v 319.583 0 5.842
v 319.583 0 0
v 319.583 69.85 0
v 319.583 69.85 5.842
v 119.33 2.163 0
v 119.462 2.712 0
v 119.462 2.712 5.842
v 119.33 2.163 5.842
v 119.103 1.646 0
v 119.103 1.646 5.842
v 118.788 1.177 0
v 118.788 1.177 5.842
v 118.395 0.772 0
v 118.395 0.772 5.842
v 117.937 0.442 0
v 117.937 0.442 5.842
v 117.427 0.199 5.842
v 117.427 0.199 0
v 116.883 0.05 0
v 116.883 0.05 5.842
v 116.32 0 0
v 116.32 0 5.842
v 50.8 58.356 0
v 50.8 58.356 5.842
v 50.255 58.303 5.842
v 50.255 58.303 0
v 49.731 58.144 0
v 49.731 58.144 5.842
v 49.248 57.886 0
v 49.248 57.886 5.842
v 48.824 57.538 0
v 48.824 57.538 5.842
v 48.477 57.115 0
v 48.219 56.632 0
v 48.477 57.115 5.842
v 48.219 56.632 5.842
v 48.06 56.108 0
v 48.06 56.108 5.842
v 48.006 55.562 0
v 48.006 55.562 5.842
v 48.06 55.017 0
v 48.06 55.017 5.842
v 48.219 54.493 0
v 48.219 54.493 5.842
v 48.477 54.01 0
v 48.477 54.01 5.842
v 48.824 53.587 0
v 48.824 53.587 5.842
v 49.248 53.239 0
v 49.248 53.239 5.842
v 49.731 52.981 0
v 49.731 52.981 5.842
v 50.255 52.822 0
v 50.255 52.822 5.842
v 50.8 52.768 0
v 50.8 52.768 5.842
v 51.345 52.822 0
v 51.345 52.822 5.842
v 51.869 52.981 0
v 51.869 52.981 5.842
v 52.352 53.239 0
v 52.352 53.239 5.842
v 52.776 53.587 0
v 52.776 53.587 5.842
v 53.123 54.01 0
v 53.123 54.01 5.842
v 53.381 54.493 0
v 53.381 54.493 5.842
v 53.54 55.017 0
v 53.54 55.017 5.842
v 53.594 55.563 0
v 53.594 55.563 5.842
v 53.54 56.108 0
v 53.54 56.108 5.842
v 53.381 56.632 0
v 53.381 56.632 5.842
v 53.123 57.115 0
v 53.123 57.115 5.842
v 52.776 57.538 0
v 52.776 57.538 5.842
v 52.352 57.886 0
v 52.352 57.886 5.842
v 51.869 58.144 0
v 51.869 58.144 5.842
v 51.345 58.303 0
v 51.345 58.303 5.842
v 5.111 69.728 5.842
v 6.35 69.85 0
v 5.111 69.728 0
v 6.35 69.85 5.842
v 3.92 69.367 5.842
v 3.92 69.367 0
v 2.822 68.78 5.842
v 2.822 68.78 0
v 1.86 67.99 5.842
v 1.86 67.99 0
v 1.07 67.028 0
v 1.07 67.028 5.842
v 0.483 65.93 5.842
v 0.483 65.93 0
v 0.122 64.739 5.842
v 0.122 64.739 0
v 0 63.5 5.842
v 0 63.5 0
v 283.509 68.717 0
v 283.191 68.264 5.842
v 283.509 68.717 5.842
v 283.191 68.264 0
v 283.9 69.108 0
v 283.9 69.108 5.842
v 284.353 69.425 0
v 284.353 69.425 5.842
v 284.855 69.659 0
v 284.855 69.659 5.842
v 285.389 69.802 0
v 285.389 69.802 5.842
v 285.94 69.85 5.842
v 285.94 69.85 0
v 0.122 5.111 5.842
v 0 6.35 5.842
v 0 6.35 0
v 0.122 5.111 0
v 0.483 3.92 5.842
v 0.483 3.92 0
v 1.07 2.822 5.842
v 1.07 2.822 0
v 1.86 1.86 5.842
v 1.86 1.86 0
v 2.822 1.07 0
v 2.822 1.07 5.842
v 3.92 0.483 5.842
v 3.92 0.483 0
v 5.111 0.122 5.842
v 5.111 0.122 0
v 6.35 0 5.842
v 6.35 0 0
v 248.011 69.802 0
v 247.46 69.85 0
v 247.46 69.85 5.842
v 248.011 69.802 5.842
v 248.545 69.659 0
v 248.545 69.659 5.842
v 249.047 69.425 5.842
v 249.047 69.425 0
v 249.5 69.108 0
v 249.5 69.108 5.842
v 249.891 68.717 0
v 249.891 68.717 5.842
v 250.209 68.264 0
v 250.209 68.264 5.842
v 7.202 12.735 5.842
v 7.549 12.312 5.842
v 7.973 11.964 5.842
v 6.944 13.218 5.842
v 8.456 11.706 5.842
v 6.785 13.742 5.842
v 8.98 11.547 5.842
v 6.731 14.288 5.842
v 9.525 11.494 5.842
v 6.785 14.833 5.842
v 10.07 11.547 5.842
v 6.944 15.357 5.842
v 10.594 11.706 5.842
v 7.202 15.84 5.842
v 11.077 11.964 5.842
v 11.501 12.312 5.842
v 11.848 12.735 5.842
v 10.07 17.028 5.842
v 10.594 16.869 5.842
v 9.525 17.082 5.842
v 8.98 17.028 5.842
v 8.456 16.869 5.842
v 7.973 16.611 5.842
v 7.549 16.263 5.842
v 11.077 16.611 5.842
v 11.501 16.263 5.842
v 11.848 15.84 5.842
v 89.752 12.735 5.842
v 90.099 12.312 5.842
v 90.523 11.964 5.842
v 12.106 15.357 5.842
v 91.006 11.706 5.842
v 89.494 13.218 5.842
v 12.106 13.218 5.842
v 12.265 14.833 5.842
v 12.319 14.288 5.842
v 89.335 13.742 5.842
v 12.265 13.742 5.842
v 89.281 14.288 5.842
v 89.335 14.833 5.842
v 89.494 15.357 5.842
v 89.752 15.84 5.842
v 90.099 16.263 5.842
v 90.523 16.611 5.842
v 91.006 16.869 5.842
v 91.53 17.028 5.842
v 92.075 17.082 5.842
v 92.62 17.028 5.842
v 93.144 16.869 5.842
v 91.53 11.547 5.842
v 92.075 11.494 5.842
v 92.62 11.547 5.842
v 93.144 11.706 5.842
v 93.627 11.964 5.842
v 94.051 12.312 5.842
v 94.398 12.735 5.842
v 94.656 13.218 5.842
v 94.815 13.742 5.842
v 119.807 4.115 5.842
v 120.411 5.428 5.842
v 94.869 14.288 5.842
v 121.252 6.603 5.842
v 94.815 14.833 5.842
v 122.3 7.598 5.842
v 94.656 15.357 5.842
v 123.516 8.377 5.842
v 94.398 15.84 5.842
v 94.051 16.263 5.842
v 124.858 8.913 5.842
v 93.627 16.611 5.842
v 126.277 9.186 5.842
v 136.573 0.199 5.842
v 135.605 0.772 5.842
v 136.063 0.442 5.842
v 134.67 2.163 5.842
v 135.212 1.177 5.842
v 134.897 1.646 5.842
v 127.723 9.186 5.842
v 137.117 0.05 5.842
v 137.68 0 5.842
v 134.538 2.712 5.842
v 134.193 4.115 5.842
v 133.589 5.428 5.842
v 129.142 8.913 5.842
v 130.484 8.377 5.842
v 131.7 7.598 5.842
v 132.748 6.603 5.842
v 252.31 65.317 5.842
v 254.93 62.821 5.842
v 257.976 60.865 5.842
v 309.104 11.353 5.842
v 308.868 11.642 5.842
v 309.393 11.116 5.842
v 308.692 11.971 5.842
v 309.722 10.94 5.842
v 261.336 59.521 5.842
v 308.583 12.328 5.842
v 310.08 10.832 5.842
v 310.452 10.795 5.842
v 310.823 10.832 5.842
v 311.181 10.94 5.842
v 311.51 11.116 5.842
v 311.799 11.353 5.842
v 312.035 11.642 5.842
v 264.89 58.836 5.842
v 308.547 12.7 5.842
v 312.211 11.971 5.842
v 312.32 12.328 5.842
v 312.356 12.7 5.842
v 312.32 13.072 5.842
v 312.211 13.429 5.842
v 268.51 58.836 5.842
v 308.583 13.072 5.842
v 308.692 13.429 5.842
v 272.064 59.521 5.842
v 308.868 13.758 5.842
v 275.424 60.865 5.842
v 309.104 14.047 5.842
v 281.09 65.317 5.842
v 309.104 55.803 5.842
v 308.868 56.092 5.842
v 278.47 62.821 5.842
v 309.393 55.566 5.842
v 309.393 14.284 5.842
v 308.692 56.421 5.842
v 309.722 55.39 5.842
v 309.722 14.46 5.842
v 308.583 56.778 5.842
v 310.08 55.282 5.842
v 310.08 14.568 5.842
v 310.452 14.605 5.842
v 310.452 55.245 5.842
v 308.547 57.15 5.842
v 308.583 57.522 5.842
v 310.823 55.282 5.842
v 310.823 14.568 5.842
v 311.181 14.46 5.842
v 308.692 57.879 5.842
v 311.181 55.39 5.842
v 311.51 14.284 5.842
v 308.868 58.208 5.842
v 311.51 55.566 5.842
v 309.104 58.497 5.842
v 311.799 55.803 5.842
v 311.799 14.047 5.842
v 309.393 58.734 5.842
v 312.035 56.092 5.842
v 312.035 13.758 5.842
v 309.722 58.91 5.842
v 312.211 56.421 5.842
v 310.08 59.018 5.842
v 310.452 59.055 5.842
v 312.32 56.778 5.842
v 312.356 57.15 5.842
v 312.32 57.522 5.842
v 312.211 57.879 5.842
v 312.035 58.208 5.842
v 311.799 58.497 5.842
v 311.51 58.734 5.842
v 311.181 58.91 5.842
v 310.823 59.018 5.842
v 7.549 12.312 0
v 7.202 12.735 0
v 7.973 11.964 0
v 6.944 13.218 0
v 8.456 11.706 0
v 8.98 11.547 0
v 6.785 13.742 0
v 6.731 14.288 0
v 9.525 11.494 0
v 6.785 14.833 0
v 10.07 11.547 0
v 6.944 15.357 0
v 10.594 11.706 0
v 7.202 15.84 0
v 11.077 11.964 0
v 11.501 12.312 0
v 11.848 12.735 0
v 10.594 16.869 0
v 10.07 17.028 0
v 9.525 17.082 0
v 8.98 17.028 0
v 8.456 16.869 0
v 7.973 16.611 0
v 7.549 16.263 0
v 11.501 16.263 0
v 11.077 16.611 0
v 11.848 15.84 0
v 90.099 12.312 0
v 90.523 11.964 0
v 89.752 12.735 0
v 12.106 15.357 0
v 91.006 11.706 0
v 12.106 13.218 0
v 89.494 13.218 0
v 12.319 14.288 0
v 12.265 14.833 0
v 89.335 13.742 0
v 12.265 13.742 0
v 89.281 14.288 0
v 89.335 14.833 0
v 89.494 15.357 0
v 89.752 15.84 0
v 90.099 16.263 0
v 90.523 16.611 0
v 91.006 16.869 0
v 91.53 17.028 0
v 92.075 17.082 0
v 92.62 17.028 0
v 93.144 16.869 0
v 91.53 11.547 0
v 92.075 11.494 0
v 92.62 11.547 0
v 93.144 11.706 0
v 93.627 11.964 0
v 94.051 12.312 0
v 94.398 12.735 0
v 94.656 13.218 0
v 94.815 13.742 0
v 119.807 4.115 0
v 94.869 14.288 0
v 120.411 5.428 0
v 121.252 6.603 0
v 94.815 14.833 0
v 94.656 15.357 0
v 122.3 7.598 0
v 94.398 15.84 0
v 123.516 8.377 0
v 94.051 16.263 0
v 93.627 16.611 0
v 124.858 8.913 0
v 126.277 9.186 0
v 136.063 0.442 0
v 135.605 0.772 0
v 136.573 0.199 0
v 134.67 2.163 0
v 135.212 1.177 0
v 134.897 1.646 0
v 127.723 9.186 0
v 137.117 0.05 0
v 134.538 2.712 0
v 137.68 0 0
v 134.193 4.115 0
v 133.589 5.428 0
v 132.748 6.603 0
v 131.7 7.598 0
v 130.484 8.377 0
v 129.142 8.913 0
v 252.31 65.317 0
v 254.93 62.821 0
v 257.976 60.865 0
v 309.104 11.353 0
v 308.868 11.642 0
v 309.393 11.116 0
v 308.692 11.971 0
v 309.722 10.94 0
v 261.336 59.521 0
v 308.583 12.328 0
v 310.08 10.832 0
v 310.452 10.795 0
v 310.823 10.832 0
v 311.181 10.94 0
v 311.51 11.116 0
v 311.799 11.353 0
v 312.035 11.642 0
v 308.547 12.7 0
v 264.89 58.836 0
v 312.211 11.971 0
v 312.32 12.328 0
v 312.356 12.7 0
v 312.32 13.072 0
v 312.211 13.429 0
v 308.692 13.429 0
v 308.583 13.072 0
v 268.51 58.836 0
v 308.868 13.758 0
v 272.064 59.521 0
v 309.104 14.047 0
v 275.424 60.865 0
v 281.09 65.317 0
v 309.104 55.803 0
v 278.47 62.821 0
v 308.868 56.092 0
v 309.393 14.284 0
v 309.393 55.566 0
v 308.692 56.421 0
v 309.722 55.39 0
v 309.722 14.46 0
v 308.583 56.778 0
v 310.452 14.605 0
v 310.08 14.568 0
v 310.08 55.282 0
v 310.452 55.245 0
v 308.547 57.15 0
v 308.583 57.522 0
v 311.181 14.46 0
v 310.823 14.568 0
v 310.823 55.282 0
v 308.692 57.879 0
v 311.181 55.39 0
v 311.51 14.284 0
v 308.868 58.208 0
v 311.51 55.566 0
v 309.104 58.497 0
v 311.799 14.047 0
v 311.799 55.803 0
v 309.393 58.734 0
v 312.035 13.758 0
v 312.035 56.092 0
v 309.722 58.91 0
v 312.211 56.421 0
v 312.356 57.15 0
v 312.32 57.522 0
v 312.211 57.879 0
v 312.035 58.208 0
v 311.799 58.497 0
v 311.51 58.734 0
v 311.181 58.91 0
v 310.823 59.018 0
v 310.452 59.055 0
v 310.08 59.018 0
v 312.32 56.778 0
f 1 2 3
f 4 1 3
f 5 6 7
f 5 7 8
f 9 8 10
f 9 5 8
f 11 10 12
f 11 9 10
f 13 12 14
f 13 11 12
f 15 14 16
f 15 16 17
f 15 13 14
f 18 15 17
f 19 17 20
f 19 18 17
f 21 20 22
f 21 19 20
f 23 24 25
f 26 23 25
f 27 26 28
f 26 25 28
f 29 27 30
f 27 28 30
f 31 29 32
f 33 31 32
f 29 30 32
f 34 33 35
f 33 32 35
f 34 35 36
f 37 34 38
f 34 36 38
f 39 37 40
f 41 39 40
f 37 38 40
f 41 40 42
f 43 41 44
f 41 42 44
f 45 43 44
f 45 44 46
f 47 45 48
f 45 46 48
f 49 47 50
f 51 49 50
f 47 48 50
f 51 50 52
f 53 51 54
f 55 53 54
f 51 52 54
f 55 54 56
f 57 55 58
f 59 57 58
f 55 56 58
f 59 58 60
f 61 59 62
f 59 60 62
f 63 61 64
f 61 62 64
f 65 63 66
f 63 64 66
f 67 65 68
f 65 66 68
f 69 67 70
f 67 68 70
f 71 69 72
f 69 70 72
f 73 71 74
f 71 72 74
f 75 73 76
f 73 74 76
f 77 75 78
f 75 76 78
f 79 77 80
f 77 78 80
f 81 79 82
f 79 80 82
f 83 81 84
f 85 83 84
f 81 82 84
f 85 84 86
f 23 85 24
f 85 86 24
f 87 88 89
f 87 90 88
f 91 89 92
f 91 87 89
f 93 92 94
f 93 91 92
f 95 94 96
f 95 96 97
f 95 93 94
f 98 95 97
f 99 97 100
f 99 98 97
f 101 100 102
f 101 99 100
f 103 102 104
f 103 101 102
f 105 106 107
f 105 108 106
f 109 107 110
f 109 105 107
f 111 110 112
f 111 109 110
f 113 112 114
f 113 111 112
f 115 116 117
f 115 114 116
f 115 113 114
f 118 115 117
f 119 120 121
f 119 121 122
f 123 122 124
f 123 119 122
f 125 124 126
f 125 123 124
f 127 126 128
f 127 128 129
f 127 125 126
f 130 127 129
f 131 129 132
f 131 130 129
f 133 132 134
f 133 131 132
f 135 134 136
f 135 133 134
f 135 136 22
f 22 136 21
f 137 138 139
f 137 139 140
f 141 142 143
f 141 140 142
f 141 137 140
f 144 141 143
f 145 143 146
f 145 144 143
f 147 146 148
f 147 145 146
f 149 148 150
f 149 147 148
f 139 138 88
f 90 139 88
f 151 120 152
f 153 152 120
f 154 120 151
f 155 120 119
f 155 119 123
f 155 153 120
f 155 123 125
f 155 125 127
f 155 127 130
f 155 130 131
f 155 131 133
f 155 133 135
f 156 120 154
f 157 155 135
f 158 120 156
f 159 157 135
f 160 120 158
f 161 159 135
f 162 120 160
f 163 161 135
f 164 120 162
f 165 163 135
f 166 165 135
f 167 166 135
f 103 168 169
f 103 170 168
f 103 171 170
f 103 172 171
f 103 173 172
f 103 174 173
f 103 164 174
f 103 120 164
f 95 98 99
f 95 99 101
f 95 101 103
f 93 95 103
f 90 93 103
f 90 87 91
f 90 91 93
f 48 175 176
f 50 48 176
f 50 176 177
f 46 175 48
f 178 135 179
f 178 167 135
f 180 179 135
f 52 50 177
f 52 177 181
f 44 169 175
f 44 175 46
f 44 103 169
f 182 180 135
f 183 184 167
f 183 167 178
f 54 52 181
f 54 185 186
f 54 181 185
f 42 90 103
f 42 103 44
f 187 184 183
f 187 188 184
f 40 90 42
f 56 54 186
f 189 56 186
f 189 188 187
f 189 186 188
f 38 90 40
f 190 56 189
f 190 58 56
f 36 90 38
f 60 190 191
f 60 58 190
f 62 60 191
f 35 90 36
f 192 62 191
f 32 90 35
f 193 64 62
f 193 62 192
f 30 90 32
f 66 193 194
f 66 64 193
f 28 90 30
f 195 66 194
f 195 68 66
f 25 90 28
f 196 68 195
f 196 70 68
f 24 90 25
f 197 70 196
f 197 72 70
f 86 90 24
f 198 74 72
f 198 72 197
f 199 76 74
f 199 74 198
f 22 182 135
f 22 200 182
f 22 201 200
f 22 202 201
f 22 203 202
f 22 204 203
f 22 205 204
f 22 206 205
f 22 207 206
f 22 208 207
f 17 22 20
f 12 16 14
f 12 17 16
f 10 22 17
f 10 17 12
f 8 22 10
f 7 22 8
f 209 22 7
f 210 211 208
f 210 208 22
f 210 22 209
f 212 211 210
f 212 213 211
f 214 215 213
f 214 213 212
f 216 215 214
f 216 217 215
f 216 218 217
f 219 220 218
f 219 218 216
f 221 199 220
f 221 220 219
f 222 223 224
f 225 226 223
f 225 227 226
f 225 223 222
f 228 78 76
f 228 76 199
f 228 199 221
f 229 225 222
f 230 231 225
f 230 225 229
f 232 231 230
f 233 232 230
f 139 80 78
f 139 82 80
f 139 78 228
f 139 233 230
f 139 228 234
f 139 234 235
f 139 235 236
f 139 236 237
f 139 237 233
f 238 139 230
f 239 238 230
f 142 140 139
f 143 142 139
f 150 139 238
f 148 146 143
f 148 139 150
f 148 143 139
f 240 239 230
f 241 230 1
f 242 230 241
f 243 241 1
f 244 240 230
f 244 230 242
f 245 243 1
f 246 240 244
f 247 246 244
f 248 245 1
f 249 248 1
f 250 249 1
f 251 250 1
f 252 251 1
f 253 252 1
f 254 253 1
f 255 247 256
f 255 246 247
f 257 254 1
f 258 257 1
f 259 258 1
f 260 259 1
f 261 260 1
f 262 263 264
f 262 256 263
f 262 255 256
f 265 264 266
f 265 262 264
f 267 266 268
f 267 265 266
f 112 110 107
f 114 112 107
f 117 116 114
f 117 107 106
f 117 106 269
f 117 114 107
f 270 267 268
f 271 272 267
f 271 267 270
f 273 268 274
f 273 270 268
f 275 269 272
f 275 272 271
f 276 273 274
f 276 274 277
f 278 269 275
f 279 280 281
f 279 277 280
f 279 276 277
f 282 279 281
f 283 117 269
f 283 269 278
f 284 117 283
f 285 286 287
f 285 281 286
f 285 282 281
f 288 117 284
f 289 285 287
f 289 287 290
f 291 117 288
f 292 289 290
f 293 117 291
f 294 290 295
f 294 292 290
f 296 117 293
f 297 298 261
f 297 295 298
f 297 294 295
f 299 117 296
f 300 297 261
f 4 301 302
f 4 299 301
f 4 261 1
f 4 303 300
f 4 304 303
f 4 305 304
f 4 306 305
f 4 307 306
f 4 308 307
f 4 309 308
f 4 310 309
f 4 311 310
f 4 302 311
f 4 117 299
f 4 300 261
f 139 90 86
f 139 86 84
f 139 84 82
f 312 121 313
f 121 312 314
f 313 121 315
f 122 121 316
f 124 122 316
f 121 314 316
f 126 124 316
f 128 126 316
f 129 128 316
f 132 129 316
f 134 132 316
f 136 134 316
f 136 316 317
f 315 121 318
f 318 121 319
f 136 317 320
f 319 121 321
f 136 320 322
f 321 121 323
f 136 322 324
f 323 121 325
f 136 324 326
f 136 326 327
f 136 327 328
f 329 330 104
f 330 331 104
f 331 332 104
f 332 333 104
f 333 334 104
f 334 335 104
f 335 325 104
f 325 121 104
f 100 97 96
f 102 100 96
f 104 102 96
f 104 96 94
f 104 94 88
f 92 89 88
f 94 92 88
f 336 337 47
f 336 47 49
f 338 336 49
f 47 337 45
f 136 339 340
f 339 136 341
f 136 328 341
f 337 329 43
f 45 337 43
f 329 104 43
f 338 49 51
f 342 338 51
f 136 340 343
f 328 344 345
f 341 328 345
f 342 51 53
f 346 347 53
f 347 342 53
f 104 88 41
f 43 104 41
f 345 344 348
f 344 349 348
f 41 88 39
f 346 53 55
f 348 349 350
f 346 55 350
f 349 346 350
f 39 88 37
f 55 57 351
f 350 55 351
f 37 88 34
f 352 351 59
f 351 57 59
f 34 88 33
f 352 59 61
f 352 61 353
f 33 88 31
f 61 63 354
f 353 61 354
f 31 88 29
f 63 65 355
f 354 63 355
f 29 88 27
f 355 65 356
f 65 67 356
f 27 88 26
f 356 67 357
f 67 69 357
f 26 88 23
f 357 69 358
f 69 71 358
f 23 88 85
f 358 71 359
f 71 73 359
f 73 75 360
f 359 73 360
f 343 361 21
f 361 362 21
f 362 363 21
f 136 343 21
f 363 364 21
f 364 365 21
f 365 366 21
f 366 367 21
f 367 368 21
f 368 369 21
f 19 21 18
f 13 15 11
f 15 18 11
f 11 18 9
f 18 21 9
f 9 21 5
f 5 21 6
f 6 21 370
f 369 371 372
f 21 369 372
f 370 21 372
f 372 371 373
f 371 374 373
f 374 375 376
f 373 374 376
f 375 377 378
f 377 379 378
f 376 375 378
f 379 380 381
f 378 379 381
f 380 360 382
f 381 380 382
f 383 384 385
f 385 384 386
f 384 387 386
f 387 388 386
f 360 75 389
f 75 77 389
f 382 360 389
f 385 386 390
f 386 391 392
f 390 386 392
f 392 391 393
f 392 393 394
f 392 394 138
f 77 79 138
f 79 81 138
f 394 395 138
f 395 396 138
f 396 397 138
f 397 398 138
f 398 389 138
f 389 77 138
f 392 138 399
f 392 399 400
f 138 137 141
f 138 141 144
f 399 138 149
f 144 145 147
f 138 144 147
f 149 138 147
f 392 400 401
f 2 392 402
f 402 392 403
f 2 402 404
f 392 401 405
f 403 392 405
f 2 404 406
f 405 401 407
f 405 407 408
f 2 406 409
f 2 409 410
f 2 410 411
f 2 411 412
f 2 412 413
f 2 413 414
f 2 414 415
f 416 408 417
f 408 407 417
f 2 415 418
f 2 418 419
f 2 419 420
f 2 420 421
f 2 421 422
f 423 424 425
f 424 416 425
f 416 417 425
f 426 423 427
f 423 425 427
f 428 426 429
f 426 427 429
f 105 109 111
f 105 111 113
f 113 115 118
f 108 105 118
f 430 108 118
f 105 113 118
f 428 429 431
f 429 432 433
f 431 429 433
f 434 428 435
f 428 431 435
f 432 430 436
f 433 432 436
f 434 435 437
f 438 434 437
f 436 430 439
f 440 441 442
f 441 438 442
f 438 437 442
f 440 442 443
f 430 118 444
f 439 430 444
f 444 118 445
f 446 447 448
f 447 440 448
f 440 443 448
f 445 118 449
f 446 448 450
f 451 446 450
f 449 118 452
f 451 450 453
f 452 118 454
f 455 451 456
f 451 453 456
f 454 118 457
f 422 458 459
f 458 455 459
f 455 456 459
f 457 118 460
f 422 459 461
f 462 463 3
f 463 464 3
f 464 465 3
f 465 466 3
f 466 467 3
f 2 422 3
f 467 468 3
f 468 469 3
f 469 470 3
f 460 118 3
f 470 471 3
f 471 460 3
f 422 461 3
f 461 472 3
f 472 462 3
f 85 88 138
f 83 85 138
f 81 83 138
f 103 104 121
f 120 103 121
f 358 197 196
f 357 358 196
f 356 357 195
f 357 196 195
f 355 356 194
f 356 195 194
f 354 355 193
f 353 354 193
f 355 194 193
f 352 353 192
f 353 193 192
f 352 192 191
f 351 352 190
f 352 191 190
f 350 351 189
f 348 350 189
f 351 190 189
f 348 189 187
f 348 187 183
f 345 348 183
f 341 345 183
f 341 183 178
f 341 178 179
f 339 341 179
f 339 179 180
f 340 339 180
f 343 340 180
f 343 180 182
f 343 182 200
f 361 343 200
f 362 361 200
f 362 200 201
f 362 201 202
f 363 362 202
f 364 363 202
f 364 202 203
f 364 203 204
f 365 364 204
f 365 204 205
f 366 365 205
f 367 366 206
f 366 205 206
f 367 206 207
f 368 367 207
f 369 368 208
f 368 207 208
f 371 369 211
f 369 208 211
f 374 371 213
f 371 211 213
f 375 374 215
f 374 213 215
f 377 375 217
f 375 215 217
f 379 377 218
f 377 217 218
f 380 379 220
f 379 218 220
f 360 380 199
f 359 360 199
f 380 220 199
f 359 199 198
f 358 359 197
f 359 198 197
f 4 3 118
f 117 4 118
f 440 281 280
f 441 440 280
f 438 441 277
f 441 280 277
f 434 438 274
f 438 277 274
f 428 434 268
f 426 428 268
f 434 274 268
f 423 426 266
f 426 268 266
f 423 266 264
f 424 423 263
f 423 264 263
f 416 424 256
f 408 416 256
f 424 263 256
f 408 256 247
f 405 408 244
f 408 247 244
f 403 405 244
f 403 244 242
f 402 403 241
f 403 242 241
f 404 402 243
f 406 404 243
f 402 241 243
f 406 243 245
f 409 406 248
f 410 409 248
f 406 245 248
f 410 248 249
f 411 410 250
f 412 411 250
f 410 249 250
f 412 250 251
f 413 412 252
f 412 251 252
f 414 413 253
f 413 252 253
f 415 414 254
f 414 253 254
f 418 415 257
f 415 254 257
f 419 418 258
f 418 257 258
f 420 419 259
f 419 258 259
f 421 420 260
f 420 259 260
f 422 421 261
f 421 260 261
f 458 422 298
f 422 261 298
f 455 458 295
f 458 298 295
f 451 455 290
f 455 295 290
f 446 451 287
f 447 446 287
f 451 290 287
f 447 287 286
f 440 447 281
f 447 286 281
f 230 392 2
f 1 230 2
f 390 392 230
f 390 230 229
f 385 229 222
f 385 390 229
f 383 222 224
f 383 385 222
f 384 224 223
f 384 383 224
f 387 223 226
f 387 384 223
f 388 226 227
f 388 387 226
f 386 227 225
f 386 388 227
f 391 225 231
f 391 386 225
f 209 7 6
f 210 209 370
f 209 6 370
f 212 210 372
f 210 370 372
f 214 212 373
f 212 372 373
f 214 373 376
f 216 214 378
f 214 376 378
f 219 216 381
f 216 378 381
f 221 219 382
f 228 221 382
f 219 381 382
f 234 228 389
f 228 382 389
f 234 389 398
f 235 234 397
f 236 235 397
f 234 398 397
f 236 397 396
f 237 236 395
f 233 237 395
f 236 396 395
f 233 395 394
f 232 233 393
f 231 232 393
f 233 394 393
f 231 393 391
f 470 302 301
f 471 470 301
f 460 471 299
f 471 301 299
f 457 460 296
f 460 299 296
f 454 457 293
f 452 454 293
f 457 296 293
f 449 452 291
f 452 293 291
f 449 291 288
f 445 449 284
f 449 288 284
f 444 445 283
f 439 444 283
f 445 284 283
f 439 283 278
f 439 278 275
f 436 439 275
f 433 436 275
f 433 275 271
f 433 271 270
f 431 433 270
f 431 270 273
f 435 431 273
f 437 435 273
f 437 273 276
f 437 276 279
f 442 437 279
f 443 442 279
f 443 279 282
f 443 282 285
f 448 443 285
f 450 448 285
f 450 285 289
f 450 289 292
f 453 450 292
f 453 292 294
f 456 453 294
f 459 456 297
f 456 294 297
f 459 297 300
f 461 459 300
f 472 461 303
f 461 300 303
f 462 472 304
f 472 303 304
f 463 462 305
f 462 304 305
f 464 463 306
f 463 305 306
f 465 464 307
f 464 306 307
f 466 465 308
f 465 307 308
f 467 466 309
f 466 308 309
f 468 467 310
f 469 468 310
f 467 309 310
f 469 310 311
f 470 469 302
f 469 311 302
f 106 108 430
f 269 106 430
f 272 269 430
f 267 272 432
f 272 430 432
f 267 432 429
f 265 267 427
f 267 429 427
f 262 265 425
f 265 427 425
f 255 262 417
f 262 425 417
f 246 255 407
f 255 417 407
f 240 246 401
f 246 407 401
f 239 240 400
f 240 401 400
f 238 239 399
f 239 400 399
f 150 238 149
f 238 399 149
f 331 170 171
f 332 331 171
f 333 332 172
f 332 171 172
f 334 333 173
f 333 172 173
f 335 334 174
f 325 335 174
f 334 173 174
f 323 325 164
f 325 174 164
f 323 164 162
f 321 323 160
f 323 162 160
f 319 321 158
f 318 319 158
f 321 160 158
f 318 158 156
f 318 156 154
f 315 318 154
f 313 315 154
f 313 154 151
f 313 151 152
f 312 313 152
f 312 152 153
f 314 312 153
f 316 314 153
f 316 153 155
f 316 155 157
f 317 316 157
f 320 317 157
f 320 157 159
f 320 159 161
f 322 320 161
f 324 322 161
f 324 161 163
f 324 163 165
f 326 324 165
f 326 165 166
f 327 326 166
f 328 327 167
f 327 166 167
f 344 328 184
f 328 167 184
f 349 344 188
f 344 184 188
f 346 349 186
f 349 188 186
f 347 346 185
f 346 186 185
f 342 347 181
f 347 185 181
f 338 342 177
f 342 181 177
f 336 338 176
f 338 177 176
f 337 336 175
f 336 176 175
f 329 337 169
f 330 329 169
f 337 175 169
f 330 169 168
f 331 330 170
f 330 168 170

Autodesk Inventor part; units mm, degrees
ref_plane "YZ Plane" through (0, 0, 0) normal (1, 0, 0) x (0, 1, 0)
ref_plane "XZ Plane" through (0, 0, 0) normal (0, 1, 0) x (-1, 0, 0)
ref_plane "XY Plane" through (0, 0, 0) normal (0, 0, 1) x (1, 0, 0)
sketch "Sketch1" plane through (0, 0, 0) normal (0, 0, 1) x (1, 0, 0)
  line L0 (0, 121.6177) -> (0, -51.755) projected
  line L1 (-63.9166, 0) -> (383.4994, 0) projected
  line L2 (0, 0) -> (319.5828, 0)
  line L3 (319.5828, 0) -> (319.5828, 69.85)
  line L4 (319.5828, 69.85) -> (0, 69.85)
  line L5 (0, 69.85) -> (0, 0)
  line L6 (9.525, 14.2875) -> (92.075, 14.2875) construction
  circle A0 centre (50.8, 14.2875) radius 41.275 construction
  line L7 (0, 34.925) -> (319.5828, 34.925) construction
  circle A1 centre (266.7, 77.8002) radius 19.05
  circle A2 centre (127, 1.6002) radius 7.62
  point P0 (50.8, 55.5625)
  point P1 (310.4515, 57.15)
  point P2 (310.4515, 12.7)
  dimension "d0" = 319.5828
  dimension "d1" = 69.85
  dimension "d2" = 82.55
  dimension "d5" = 14.2875
  dimension "d7" = 14.2875
  dimension "d8" = 9.525
  dimension "d9" = 9.1313
  dimension "d10" = 22.225
  dimension "d11" = 22.225
  dimension "d29" = 266.7
  dimension "d30" = 7.9502
  dimension "d31" = 38.1
  dimension "d35" = 15.24
  dimension "d36" = 1.6002
  dimension "d37" = 127
extrude "Extrusion1" add sketch "Sketch1" along normal blind 5.842 contours L4 A1 L3 L1 A2 L0 | L4 A1 | A2 L1 picked at (261.678, 68.614) picked at (126.7265, 4.018)
hole "Hole1" at (310.4515, 57.15, 0) at (310.4515, 12.7, 0) direction (0, 0, 1) diameter 3.81 end through all
hole "Hole2" at (9.525, 14.2875, 0) at (92.075, 14.2875, 0) at (50.8, 55.5625, 0) direction (0, 0, 1) diameter 5.588 end through all
fillet "Fillet1" radius 6.35 2 edges at (0, 69.85, 2.921) (0, 0, 2.921)
extrude "Extrusion2" cut sketch "Sketch1" along normal up to next contours A1 L4 | L4 A1 | A2 L1 | L1 A2
fillet "Fillet2" radius 3.175 4 edges at (249.3882, 69.85, 2.921) (284.0118, 69.85, 2.921) (134.4501, 0, 2.921) (119.5499, 0, 2.921)
sketch "Sketch2" plane through (0, 0, 5.842) normal (0, 0, 1) x (1, 0, 0)
  point P0 (0, 0)
equation "\"d5\" = d7"
